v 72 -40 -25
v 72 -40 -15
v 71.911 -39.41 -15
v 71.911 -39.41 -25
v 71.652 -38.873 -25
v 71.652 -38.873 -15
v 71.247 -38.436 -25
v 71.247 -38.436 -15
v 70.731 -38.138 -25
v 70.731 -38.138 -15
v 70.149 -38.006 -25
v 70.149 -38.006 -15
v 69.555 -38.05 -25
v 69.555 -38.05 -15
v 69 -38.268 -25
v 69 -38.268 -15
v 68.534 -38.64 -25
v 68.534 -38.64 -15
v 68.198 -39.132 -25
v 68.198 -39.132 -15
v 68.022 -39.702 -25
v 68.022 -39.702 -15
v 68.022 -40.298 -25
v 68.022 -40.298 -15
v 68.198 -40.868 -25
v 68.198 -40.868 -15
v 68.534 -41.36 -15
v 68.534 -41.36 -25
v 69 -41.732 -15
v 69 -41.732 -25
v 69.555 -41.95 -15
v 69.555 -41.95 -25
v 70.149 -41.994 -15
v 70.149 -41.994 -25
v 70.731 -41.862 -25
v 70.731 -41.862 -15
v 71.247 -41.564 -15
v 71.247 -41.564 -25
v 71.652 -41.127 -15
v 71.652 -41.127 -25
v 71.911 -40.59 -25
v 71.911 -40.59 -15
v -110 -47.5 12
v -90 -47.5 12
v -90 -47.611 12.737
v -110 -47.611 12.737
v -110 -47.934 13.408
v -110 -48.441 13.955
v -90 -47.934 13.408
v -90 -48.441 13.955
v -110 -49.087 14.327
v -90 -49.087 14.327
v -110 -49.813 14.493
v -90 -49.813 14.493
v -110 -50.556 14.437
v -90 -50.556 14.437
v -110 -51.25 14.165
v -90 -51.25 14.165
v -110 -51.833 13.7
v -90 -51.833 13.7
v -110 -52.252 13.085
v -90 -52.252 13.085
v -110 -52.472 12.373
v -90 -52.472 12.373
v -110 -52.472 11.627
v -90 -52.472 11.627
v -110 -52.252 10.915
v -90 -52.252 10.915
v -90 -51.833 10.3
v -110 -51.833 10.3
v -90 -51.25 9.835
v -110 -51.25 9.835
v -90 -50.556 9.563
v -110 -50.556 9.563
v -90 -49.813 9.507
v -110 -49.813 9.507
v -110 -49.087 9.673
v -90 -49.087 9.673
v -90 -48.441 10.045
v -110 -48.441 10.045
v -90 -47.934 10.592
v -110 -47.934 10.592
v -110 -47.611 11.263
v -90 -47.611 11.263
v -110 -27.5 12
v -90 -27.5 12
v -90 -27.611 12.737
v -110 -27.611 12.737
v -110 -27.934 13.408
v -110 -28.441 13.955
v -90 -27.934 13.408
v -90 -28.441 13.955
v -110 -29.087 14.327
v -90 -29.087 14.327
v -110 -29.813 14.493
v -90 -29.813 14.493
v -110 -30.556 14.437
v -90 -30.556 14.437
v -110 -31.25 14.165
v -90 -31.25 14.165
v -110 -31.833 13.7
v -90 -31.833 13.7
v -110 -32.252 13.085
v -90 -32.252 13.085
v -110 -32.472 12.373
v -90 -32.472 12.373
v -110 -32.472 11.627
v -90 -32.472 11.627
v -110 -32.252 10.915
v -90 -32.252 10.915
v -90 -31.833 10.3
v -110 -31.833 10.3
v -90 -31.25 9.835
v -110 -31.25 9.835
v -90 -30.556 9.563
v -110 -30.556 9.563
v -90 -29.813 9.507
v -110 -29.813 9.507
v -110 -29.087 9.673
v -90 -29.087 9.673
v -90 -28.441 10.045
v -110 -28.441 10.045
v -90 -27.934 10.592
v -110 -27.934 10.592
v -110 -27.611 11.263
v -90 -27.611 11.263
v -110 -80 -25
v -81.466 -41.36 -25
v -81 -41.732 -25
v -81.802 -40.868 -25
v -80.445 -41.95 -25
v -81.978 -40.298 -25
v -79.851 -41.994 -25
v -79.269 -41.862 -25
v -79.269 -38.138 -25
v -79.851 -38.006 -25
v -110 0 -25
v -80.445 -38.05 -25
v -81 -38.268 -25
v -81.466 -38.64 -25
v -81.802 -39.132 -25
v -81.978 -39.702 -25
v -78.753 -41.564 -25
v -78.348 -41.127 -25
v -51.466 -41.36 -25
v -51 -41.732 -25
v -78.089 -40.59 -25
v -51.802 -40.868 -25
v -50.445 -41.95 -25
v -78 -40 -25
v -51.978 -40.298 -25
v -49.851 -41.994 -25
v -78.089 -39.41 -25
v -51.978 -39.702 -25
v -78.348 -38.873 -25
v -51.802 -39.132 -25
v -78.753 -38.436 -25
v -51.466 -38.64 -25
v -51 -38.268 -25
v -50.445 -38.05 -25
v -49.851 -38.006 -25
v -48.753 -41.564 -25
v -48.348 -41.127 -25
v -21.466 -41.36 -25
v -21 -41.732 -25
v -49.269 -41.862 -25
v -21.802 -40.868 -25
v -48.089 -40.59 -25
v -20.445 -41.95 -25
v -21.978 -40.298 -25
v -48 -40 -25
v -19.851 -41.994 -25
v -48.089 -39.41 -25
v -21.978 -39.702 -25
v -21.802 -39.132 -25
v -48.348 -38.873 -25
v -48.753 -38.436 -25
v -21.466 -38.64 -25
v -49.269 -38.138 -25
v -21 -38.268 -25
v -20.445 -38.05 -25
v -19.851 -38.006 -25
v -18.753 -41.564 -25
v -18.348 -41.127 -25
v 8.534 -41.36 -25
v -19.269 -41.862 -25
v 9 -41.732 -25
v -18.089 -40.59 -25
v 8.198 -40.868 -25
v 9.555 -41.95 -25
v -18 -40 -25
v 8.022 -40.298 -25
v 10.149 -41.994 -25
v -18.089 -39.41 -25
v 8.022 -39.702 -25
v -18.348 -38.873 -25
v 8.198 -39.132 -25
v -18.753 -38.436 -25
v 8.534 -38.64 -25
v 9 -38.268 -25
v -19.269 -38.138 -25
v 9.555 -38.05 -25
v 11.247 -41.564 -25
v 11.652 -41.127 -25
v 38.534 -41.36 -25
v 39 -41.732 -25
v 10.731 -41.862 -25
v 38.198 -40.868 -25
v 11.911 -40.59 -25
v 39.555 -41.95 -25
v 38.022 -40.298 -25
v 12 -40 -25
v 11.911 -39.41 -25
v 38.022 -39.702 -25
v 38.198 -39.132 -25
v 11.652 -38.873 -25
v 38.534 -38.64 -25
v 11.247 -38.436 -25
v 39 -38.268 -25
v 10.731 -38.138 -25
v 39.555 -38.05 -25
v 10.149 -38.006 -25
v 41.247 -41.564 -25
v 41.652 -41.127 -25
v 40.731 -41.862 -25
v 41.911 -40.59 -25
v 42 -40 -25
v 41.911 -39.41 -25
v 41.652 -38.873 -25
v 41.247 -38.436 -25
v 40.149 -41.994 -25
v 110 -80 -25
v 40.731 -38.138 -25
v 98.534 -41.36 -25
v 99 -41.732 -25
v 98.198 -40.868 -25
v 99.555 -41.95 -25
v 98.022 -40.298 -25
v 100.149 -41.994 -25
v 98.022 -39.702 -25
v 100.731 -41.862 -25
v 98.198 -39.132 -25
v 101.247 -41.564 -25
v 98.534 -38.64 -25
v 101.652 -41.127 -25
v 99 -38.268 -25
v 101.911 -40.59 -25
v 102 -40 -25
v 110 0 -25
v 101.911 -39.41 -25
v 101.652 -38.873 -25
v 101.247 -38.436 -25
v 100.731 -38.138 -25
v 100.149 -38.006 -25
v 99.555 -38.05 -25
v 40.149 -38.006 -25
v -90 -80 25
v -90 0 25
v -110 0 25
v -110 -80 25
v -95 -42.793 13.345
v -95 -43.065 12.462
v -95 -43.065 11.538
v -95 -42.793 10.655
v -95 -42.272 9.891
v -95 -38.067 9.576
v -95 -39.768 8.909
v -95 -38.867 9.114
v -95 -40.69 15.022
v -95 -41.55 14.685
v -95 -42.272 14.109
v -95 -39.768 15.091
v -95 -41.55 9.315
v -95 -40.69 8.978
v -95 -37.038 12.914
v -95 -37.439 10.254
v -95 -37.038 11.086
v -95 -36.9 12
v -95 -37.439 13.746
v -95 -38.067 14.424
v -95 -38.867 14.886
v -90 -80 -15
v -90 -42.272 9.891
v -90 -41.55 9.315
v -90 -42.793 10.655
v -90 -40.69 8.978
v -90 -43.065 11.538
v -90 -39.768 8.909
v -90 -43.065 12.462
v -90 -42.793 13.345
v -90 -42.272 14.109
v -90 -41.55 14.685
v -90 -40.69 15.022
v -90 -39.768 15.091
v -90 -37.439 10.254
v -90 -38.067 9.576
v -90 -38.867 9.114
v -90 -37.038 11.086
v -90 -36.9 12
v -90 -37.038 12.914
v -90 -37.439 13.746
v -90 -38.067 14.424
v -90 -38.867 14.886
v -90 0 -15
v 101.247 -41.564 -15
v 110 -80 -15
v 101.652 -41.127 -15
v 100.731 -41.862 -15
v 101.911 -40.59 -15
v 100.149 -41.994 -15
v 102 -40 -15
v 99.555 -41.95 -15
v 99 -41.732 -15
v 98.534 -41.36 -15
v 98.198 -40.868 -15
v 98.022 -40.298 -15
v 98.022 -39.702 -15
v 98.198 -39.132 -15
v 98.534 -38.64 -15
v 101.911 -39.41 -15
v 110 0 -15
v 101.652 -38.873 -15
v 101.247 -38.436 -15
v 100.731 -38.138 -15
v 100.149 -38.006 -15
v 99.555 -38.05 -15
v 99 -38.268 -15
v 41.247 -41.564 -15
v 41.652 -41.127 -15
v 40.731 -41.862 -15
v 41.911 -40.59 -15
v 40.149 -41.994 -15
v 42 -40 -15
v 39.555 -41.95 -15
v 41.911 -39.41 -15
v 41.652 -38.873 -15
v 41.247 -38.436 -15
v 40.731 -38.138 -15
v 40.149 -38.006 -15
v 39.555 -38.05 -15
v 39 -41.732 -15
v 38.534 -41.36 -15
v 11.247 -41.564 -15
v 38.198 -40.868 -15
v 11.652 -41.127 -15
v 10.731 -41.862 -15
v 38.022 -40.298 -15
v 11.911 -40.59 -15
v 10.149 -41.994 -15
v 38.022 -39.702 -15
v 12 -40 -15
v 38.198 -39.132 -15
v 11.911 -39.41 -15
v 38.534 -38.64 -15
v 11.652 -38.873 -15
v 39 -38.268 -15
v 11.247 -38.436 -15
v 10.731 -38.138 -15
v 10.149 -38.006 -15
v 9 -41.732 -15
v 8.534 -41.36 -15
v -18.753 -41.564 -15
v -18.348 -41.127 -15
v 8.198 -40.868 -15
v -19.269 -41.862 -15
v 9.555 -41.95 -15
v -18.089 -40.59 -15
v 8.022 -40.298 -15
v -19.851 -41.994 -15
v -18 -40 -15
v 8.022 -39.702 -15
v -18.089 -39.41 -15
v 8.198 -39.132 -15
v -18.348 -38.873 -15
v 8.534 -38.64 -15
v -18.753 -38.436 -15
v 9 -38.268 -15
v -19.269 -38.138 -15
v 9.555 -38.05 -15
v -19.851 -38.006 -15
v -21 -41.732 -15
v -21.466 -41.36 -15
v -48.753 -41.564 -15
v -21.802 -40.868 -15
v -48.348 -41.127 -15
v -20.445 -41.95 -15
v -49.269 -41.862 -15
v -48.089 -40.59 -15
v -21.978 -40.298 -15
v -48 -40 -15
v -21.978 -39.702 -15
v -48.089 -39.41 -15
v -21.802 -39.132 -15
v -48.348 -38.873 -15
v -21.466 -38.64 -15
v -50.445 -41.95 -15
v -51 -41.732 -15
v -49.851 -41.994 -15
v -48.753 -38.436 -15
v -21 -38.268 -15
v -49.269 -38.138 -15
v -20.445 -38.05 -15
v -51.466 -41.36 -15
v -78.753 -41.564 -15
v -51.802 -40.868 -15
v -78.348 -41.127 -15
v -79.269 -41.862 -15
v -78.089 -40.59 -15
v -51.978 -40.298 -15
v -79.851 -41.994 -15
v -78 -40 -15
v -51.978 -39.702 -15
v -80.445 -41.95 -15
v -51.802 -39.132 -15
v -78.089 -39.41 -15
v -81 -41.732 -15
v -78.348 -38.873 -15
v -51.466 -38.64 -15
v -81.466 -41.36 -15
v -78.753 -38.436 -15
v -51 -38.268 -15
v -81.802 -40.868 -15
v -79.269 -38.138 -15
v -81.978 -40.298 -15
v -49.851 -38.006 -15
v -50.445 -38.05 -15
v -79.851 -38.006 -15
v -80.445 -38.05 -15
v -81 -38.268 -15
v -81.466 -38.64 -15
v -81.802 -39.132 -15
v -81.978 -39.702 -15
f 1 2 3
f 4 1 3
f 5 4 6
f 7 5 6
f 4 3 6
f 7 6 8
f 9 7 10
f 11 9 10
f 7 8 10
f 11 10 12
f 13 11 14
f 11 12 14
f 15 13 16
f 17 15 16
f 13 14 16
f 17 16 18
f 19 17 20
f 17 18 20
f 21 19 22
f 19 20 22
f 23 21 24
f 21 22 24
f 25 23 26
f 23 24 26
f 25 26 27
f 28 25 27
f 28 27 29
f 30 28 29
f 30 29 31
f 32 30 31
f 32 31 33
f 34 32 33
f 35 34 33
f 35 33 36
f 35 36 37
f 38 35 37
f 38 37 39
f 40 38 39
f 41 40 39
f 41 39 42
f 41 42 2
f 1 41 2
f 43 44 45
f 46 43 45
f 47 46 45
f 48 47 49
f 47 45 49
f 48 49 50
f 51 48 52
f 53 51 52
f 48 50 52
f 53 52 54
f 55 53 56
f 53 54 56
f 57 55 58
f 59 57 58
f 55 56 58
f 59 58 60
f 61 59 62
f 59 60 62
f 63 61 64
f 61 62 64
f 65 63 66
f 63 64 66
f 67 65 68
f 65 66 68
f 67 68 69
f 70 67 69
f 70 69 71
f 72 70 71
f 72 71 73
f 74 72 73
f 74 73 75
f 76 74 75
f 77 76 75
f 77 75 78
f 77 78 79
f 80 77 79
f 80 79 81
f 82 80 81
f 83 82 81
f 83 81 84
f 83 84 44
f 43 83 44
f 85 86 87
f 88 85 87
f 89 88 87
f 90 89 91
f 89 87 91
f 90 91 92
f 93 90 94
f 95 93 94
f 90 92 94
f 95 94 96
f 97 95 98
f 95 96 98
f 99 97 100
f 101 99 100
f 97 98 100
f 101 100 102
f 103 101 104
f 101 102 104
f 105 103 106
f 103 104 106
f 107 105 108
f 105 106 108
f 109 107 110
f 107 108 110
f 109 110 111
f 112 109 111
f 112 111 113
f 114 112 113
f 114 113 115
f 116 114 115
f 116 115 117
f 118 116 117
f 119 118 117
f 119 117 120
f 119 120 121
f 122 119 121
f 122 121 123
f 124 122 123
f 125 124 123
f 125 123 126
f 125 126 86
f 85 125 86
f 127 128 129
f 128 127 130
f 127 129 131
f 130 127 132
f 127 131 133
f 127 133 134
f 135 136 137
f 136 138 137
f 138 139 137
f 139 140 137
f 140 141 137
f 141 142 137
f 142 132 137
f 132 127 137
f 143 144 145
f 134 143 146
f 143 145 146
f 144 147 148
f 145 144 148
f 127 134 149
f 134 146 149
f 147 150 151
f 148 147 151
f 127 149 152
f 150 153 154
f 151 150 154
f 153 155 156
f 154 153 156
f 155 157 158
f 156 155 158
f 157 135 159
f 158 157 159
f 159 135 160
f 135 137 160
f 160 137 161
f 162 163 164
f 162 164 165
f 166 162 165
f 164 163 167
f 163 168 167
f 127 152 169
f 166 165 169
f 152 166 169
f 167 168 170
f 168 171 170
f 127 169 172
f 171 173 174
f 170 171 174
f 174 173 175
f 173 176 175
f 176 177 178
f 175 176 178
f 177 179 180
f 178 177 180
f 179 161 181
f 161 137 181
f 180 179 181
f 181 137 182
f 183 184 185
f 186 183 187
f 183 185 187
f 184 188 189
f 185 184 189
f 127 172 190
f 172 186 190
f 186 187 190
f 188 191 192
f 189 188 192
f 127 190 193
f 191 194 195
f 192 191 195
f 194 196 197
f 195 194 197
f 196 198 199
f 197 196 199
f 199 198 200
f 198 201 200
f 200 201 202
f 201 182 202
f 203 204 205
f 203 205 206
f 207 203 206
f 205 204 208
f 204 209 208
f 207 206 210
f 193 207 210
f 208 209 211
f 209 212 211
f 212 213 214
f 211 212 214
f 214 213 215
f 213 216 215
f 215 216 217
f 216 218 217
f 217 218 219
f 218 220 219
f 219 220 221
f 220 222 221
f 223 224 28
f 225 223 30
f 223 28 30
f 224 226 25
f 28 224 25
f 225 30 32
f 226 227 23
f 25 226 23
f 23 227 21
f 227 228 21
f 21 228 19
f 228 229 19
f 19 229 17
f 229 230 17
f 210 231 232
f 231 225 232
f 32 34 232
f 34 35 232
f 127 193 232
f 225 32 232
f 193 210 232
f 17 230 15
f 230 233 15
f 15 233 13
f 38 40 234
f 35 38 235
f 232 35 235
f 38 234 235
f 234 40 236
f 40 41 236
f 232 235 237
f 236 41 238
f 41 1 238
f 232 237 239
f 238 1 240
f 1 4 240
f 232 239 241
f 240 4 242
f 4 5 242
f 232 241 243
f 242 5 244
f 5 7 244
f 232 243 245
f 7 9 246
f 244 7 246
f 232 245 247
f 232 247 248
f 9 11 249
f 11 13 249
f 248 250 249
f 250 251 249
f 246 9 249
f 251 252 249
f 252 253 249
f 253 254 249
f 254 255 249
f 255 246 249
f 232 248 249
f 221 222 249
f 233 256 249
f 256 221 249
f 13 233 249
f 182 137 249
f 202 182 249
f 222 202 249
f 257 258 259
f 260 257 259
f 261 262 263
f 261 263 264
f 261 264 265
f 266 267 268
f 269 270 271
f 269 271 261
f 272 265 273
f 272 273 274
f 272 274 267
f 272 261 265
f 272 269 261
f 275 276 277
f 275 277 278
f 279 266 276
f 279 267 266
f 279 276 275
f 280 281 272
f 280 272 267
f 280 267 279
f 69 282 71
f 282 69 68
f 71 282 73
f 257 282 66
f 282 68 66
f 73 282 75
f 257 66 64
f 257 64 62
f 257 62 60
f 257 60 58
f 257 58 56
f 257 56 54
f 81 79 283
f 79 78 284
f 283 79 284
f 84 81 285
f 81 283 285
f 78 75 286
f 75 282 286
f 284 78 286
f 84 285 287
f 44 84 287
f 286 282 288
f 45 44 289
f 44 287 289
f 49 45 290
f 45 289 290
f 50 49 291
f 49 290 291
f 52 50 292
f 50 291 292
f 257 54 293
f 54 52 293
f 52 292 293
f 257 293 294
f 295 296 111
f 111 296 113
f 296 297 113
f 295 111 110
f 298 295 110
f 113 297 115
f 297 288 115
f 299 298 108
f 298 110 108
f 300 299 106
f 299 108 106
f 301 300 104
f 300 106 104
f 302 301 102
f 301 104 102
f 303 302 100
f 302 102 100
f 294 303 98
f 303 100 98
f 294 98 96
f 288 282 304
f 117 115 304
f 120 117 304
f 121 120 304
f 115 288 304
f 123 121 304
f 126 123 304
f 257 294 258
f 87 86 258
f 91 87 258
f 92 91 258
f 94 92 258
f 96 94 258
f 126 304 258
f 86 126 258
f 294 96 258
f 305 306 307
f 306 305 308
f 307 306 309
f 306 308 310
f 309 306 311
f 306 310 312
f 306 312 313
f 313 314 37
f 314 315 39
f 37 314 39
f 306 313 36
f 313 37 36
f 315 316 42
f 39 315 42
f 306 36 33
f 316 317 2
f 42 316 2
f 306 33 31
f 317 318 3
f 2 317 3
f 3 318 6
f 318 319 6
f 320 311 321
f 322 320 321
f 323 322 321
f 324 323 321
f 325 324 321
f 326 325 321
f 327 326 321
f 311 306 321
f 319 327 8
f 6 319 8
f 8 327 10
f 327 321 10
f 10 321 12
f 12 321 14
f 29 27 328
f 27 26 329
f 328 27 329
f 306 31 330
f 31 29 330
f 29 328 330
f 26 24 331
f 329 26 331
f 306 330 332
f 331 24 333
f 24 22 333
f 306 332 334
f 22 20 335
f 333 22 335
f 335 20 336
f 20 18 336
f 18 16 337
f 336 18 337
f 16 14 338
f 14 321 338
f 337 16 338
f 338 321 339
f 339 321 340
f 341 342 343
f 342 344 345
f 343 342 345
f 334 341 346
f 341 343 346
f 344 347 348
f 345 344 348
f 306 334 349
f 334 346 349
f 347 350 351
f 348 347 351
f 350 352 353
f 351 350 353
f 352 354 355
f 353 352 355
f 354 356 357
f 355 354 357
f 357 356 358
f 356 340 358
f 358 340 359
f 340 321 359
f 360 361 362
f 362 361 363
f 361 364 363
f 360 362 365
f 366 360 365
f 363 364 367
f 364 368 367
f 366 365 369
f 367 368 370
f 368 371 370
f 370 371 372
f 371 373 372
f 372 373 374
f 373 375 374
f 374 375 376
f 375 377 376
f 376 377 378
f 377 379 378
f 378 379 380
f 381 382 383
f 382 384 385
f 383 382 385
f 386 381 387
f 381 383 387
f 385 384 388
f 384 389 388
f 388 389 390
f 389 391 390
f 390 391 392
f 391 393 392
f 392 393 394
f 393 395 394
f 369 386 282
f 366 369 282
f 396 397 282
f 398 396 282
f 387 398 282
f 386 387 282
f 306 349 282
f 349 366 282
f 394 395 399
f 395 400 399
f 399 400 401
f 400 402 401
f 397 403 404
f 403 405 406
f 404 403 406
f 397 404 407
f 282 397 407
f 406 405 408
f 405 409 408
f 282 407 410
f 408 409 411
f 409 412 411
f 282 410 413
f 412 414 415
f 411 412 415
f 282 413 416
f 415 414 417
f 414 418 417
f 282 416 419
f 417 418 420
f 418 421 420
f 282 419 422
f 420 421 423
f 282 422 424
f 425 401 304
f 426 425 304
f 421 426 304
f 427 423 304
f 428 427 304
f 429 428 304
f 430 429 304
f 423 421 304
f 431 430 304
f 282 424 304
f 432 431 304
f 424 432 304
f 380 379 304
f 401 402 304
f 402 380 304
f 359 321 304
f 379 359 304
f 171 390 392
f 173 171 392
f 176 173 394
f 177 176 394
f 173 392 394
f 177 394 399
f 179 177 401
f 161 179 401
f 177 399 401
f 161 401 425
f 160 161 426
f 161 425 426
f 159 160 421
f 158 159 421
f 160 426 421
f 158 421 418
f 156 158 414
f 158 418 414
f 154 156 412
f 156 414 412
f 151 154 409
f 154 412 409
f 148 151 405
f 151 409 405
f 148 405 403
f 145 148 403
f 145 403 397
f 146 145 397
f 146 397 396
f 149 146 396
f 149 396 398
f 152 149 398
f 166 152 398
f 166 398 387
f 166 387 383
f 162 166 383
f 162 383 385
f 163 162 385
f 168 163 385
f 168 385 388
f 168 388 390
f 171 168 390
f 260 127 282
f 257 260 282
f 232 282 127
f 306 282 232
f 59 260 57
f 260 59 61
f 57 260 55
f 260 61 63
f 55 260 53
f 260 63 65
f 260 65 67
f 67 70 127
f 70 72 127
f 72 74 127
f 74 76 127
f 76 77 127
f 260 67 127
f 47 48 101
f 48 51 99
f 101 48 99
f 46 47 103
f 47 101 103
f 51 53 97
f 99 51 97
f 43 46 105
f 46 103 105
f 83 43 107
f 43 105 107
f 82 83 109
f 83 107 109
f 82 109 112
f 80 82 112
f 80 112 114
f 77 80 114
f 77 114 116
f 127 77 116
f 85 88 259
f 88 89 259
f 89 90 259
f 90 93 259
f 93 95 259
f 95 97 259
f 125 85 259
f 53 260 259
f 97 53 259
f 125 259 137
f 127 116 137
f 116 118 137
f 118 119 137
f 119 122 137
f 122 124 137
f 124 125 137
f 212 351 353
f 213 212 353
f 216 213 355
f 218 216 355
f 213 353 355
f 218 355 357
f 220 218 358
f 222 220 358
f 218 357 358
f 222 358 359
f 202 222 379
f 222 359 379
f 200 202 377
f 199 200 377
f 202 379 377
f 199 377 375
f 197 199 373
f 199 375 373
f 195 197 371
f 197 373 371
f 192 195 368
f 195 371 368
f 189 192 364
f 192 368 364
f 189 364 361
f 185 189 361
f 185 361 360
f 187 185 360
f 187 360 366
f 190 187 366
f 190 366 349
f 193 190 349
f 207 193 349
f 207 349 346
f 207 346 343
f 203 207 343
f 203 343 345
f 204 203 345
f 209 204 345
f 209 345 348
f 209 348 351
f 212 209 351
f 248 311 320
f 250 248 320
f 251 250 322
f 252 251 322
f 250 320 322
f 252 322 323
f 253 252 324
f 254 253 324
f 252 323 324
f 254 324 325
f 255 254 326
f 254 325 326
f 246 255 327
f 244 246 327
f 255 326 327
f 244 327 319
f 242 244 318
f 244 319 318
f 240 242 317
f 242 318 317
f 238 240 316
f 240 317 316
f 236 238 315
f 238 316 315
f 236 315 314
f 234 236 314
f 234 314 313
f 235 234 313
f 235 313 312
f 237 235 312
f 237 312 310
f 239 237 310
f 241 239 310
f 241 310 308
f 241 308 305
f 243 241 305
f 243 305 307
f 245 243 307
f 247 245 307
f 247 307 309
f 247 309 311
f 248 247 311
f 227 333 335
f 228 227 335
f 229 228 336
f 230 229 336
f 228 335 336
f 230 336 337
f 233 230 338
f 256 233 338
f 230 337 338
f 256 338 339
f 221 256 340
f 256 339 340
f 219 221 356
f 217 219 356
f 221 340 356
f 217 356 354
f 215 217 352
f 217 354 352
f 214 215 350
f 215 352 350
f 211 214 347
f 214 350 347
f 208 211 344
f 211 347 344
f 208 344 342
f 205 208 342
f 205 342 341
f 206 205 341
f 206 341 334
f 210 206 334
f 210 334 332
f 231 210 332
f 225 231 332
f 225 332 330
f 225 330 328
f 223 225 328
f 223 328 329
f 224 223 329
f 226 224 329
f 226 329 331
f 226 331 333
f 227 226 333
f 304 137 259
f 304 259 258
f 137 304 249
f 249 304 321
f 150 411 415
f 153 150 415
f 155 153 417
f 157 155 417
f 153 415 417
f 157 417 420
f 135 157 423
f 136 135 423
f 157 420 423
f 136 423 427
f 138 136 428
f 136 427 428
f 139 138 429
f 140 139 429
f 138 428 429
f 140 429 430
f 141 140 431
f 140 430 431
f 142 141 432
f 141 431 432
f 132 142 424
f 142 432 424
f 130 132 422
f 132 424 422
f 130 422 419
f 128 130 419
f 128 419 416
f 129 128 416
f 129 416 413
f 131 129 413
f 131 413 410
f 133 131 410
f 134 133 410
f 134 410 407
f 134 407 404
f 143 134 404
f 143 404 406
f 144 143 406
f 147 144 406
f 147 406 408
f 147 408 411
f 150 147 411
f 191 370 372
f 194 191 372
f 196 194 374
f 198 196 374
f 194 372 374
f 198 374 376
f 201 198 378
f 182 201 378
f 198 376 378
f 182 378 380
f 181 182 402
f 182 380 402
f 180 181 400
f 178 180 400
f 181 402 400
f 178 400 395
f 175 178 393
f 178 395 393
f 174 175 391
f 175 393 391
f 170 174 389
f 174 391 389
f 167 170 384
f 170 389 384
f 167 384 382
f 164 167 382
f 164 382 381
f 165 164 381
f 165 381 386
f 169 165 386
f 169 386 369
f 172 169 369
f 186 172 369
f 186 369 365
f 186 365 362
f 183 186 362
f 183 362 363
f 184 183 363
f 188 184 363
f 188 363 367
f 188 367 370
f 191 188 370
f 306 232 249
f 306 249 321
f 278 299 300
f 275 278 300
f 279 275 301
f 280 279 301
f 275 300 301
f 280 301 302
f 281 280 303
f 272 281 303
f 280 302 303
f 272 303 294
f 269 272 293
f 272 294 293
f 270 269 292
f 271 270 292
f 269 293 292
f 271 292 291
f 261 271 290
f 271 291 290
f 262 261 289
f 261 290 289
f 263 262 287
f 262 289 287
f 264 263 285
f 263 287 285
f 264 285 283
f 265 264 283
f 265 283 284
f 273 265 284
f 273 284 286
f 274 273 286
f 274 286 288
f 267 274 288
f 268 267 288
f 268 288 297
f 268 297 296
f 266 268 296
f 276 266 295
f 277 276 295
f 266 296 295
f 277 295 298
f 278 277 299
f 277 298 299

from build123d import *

# Parameters (mm, degrees)
F1_DEPTH = 80
F2_R     = 2
F3_DEPTH = 25
F4_R     = 2.5
F5_DEPTH = 22
F4_R_2   = 3.1
F6_DEPTH = 5


# Not quite as in the source:
# - a feature names something its author has since deleted; it is built from what else it names


with BuildPart() as f1:
    # F0 (on Front) → F1 (new body)
    with BuildSketch(Plane.XZ):
        Polygon((-110, -25), (110, -25), (110, -15), (-90, -15), (-90, 25), (-110, 25), align=None)
    extrude(amount=F1_DEPTH)

    # F2 (on face) → F3 (cut)
    with BuildSketch(Plane.XY.offset(-15)):
        with Locations((-80, -40)):
            Circle(F2_R)
        with Locations((-50, -40)):
            Circle(F2_R)
        with Locations((-20, -40)):
            Circle(F2_R)
        with Locations((10, -40)):
            Circle(F2_R)
        with Locations((40, -40)):
            Circle(F2_R)
        with Locations((70, -40)):
            Circle(F2_R)
        with Locations((100, -40)):
            Circle(F2_R)
    extrude(amount=-F3_DEPTH, mode=Mode.SUBTRACT)

    # F4 (on face) → F5 (cut)
    with BuildSketch(Plane.YZ.offset(-90)):
        with Locations((-50, 12)):
            Circle(F4_R)
        with Locations((-30, 12)):
            Circle(F4_R)
    extrude(amount=-F5_DEPTH, mode=Mode.SUBTRACT)

    # F4 (on face) → F6 (cut)
    with BuildSketch(Plane.YZ.offset(-90)):
        with Locations((-40, 12)):
            Circle(F4_R_2)
    extrude(amount=-F6_DEPTH, mode=Mode.SUBTRACT)


solid = f1.part
